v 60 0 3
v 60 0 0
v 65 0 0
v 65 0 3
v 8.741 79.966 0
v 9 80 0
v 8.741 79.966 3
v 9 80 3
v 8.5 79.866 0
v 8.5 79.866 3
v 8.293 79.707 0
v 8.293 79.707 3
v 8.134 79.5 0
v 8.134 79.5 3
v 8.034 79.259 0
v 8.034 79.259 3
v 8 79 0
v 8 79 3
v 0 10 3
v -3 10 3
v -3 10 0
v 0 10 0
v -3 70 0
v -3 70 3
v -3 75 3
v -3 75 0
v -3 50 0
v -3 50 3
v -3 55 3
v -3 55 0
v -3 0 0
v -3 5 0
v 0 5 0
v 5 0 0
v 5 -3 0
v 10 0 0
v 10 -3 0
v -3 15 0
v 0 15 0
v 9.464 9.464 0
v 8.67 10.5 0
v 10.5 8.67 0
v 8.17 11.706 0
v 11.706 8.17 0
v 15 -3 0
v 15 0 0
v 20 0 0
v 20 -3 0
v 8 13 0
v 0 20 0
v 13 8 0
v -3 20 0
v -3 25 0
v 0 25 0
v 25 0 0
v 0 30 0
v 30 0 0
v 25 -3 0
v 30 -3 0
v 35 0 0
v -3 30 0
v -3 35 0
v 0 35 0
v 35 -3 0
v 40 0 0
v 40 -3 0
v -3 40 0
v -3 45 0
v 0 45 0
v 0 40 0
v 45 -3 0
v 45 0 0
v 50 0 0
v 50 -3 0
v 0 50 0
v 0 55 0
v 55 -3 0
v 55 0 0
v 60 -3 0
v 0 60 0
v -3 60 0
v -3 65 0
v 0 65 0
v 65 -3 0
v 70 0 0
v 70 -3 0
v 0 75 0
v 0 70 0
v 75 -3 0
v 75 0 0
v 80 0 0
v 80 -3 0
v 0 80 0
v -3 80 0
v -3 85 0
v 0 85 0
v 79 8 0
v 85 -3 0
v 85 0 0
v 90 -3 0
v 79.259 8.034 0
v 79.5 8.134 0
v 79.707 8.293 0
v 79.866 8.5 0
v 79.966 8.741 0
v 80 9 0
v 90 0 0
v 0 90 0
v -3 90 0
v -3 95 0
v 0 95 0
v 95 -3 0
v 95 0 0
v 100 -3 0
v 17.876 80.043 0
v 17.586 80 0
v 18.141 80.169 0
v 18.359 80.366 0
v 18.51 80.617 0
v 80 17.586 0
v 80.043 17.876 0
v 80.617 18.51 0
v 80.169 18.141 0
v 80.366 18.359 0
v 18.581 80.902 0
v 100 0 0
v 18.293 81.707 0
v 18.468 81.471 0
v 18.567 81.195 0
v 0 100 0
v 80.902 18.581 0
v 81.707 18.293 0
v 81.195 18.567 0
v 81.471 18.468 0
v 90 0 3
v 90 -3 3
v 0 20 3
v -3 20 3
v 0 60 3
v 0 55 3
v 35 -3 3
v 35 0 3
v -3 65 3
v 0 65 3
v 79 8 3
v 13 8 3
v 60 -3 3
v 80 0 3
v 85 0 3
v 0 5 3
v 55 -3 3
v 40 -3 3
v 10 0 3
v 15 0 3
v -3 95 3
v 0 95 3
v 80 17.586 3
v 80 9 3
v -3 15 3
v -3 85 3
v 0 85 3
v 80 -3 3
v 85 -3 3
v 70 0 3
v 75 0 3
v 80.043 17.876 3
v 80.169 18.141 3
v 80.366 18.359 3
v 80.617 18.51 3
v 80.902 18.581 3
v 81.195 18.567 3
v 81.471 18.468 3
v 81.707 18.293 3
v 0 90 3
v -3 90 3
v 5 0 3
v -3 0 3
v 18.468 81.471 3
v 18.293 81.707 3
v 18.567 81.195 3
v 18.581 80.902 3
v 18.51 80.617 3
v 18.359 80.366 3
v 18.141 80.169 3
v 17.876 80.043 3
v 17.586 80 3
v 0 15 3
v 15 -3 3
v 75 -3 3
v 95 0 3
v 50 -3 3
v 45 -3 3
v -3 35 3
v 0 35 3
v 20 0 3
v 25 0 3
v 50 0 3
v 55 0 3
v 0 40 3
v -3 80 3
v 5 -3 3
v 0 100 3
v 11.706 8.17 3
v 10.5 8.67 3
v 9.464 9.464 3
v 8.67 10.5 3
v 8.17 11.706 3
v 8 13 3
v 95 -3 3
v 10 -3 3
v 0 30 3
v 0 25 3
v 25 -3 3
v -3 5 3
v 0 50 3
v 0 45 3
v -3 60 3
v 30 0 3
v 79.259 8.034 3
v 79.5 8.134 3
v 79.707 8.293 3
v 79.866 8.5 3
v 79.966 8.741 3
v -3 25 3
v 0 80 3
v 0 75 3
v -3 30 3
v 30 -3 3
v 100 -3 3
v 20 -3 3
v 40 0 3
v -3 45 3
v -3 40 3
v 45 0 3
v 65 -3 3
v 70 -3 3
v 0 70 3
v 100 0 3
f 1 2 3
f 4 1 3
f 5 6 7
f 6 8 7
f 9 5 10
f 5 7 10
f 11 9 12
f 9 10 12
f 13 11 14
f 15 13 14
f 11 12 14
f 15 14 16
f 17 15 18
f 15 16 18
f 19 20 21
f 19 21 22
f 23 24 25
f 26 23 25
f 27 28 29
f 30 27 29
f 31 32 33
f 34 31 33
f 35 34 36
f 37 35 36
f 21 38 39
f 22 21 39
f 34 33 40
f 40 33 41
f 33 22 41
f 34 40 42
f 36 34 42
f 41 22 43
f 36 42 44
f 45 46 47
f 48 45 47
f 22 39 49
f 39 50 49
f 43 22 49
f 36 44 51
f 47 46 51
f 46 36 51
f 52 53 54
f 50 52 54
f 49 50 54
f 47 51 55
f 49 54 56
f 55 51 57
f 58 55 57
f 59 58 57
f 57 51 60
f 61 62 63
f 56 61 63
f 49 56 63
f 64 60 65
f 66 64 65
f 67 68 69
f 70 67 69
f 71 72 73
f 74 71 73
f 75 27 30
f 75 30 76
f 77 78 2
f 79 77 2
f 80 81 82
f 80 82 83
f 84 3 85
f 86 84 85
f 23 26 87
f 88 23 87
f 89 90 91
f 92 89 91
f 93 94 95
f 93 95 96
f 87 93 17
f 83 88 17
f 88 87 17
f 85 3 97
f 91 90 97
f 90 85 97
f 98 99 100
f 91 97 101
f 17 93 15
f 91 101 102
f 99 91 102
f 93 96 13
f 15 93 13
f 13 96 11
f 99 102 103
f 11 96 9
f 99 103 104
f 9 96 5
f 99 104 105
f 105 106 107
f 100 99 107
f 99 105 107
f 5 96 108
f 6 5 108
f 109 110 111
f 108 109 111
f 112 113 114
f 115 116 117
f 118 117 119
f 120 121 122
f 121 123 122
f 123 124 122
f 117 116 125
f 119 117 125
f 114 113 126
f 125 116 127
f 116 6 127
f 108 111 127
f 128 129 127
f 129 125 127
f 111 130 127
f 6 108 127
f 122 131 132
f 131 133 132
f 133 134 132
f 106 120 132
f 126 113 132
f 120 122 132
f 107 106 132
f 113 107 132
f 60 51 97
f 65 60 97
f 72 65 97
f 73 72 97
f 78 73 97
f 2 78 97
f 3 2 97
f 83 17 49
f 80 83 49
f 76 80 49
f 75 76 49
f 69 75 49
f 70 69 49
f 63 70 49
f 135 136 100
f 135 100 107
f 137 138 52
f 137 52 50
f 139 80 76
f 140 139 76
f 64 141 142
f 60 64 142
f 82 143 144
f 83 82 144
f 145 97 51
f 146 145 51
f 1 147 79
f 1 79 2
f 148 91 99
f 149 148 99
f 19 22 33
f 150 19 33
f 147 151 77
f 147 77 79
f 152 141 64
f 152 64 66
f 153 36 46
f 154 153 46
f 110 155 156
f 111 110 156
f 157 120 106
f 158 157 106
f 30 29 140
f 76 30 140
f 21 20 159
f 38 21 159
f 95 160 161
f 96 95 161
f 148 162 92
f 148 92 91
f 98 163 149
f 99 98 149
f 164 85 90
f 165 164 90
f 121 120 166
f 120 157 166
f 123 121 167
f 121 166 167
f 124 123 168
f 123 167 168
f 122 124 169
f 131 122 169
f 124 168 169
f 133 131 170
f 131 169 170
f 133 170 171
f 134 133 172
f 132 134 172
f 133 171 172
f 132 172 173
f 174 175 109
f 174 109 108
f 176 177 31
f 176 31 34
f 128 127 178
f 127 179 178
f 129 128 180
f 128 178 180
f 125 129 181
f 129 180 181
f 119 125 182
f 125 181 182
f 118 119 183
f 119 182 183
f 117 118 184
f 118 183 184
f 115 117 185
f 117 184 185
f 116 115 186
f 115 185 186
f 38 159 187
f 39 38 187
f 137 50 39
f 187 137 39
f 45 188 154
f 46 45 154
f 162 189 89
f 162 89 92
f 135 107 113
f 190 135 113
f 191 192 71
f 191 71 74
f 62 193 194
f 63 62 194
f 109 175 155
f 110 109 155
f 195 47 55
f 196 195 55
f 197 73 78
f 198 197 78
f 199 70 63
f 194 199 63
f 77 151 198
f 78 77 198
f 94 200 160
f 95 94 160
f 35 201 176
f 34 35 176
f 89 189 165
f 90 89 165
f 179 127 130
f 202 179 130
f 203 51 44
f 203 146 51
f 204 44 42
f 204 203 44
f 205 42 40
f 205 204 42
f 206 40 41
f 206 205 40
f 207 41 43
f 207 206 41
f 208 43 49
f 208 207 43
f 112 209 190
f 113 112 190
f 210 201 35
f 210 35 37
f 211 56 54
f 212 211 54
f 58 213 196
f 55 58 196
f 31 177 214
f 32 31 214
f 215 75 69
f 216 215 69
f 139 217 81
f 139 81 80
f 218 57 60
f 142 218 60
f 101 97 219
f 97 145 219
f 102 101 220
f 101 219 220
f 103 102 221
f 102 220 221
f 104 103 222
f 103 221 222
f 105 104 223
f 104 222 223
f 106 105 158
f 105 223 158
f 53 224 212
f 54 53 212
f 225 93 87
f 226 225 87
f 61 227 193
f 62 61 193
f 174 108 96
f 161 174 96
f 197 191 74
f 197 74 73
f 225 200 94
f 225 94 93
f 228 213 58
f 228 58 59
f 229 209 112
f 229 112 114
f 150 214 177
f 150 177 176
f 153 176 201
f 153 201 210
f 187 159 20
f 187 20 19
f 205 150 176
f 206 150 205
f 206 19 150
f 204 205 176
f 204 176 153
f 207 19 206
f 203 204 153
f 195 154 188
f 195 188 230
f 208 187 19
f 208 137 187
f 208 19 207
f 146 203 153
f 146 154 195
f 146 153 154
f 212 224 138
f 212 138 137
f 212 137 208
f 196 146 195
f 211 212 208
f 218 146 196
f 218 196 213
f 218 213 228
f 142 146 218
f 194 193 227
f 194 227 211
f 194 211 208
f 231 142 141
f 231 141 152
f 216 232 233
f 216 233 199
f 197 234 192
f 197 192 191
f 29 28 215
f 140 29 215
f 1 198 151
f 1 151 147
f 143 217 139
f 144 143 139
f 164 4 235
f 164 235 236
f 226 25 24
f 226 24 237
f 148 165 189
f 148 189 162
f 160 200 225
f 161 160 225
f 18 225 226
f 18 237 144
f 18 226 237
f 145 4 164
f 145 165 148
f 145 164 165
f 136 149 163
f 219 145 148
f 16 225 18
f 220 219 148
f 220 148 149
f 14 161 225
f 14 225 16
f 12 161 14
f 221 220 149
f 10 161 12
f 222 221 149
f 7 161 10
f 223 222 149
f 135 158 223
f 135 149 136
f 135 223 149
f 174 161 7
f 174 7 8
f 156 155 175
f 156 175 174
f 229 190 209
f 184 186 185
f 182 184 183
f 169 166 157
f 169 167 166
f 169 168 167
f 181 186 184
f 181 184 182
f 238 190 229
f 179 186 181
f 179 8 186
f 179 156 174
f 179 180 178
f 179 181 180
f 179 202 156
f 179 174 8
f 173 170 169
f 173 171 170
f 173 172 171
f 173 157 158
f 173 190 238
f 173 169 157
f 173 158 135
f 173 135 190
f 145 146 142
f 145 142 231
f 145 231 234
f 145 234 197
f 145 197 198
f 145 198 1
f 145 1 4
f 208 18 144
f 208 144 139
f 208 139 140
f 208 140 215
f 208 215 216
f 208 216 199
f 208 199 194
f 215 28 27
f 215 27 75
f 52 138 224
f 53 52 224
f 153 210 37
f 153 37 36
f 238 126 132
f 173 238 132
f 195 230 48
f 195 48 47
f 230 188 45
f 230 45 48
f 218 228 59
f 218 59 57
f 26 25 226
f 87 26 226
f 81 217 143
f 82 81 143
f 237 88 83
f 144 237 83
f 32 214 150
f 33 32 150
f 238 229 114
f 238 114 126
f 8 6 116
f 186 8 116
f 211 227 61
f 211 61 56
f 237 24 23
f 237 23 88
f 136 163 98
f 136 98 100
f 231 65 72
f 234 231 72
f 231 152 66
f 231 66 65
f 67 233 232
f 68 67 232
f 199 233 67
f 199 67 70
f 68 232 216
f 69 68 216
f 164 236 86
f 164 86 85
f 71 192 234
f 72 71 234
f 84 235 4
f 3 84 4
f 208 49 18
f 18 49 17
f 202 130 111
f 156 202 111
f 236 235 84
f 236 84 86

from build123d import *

# Parameters (mm, degrees)
F1_DEPTH = 3
F3_W     = 3
F3_H     = 5
F2_W     = 5
F2_H     = 3
F4_DEPTH = 3
F5_R     = 1
F6_R     = 5


with BuildPart() as f1:
    # F0 (on Top) → F1 (new body)
    with BuildSketch(Plane.XY):
        Polygon((20, 80), (0, 100), (0, 0), (100, 0), (80, 20), (80, 8), (8, 8), (8, 80), align=None)
    extrude(amount=F1_DEPTH)

    # F3 (on face) + F2 (on face) → F4 (join)
    with BuildSketch(Plane.XY.offset(3)):
        with Locations((-1.5, 42.5)):
            Rectangle(F3_W, F3_H)
        with Locations((-1.5, 32.5)):
            Rectangle(F3_W, F3_H)
        with Locations((-1.5, 22.5)):
            Rectangle(F3_W, F3_H)
        with Locations((-1.5, 12.5)):
            Rectangle(F3_W, F3_H)
        with Locations((-1.5, 2.5)):
            Rectangle(F3_W, F3_H)
        with Locations((-1.5, 52.5)):
            Rectangle(F3_W, F3_H)
        with Locations((-1.5, 72.5)):
            Rectangle(F3_W, F3_H)
        with Locations((-1.5, 82.5)):
            Rectangle(F3_W, F3_H)
        with Locations((-1.5, 92.5)):
            Rectangle(F3_W, F3_H)
        with Locations((-1.5, 62.5)):
            Rectangle(F3_W, F3_H)
    with BuildSketch(Plane.XY.offset(3)):
        with Locations((7.5, -1.5)):
            Rectangle(F2_W, F2_H)
        with Locations((17.5, -1.5)):
            Rectangle(F2_W, F2_H)
        with Locations((27.5, -1.5)):
            Rectangle(F2_W, F2_H)
        with Locations((37.5, -1.5)):
            Rectangle(F2_W, F2_H)
        with Locations((47.5, -1.5)):
            Rectangle(F2_W, F2_H)
        with Locations((57.5, -1.5)):
            Rectangle(F2_W, F2_H)
        with Locations((67.5, -1.5)):
            Rectangle(F2_W, F2_H)
        with Locations((77.5, -1.5)):
            Rectangle(F2_W, F2_H)
        with Locations((87.5, -1.5)):
            Rectangle(F2_W, F2_H)
        with Locations((97.5, -1.5)):
            Rectangle(F2_W, F2_H)
    extrude(amount=-F4_DEPTH)

    # F5
    f5_edges = [f1.edges().sort_by_distance(p)[0] for p in [
        (80, 20, 1.5),
        (8, 80, 1.5),
        (20, 80, 1.5),
        (80, 8, 1.5),
    ]]
    fillet(f5_edges, radius=F5_R)

    # F6
    f6_edges = [f1.edges().sort_by_distance(p)[0] for p in [
        (8, 8, 1.5),
    ]]
    fillet(f6_edges, radius=F6_R)


solid = f1.part
